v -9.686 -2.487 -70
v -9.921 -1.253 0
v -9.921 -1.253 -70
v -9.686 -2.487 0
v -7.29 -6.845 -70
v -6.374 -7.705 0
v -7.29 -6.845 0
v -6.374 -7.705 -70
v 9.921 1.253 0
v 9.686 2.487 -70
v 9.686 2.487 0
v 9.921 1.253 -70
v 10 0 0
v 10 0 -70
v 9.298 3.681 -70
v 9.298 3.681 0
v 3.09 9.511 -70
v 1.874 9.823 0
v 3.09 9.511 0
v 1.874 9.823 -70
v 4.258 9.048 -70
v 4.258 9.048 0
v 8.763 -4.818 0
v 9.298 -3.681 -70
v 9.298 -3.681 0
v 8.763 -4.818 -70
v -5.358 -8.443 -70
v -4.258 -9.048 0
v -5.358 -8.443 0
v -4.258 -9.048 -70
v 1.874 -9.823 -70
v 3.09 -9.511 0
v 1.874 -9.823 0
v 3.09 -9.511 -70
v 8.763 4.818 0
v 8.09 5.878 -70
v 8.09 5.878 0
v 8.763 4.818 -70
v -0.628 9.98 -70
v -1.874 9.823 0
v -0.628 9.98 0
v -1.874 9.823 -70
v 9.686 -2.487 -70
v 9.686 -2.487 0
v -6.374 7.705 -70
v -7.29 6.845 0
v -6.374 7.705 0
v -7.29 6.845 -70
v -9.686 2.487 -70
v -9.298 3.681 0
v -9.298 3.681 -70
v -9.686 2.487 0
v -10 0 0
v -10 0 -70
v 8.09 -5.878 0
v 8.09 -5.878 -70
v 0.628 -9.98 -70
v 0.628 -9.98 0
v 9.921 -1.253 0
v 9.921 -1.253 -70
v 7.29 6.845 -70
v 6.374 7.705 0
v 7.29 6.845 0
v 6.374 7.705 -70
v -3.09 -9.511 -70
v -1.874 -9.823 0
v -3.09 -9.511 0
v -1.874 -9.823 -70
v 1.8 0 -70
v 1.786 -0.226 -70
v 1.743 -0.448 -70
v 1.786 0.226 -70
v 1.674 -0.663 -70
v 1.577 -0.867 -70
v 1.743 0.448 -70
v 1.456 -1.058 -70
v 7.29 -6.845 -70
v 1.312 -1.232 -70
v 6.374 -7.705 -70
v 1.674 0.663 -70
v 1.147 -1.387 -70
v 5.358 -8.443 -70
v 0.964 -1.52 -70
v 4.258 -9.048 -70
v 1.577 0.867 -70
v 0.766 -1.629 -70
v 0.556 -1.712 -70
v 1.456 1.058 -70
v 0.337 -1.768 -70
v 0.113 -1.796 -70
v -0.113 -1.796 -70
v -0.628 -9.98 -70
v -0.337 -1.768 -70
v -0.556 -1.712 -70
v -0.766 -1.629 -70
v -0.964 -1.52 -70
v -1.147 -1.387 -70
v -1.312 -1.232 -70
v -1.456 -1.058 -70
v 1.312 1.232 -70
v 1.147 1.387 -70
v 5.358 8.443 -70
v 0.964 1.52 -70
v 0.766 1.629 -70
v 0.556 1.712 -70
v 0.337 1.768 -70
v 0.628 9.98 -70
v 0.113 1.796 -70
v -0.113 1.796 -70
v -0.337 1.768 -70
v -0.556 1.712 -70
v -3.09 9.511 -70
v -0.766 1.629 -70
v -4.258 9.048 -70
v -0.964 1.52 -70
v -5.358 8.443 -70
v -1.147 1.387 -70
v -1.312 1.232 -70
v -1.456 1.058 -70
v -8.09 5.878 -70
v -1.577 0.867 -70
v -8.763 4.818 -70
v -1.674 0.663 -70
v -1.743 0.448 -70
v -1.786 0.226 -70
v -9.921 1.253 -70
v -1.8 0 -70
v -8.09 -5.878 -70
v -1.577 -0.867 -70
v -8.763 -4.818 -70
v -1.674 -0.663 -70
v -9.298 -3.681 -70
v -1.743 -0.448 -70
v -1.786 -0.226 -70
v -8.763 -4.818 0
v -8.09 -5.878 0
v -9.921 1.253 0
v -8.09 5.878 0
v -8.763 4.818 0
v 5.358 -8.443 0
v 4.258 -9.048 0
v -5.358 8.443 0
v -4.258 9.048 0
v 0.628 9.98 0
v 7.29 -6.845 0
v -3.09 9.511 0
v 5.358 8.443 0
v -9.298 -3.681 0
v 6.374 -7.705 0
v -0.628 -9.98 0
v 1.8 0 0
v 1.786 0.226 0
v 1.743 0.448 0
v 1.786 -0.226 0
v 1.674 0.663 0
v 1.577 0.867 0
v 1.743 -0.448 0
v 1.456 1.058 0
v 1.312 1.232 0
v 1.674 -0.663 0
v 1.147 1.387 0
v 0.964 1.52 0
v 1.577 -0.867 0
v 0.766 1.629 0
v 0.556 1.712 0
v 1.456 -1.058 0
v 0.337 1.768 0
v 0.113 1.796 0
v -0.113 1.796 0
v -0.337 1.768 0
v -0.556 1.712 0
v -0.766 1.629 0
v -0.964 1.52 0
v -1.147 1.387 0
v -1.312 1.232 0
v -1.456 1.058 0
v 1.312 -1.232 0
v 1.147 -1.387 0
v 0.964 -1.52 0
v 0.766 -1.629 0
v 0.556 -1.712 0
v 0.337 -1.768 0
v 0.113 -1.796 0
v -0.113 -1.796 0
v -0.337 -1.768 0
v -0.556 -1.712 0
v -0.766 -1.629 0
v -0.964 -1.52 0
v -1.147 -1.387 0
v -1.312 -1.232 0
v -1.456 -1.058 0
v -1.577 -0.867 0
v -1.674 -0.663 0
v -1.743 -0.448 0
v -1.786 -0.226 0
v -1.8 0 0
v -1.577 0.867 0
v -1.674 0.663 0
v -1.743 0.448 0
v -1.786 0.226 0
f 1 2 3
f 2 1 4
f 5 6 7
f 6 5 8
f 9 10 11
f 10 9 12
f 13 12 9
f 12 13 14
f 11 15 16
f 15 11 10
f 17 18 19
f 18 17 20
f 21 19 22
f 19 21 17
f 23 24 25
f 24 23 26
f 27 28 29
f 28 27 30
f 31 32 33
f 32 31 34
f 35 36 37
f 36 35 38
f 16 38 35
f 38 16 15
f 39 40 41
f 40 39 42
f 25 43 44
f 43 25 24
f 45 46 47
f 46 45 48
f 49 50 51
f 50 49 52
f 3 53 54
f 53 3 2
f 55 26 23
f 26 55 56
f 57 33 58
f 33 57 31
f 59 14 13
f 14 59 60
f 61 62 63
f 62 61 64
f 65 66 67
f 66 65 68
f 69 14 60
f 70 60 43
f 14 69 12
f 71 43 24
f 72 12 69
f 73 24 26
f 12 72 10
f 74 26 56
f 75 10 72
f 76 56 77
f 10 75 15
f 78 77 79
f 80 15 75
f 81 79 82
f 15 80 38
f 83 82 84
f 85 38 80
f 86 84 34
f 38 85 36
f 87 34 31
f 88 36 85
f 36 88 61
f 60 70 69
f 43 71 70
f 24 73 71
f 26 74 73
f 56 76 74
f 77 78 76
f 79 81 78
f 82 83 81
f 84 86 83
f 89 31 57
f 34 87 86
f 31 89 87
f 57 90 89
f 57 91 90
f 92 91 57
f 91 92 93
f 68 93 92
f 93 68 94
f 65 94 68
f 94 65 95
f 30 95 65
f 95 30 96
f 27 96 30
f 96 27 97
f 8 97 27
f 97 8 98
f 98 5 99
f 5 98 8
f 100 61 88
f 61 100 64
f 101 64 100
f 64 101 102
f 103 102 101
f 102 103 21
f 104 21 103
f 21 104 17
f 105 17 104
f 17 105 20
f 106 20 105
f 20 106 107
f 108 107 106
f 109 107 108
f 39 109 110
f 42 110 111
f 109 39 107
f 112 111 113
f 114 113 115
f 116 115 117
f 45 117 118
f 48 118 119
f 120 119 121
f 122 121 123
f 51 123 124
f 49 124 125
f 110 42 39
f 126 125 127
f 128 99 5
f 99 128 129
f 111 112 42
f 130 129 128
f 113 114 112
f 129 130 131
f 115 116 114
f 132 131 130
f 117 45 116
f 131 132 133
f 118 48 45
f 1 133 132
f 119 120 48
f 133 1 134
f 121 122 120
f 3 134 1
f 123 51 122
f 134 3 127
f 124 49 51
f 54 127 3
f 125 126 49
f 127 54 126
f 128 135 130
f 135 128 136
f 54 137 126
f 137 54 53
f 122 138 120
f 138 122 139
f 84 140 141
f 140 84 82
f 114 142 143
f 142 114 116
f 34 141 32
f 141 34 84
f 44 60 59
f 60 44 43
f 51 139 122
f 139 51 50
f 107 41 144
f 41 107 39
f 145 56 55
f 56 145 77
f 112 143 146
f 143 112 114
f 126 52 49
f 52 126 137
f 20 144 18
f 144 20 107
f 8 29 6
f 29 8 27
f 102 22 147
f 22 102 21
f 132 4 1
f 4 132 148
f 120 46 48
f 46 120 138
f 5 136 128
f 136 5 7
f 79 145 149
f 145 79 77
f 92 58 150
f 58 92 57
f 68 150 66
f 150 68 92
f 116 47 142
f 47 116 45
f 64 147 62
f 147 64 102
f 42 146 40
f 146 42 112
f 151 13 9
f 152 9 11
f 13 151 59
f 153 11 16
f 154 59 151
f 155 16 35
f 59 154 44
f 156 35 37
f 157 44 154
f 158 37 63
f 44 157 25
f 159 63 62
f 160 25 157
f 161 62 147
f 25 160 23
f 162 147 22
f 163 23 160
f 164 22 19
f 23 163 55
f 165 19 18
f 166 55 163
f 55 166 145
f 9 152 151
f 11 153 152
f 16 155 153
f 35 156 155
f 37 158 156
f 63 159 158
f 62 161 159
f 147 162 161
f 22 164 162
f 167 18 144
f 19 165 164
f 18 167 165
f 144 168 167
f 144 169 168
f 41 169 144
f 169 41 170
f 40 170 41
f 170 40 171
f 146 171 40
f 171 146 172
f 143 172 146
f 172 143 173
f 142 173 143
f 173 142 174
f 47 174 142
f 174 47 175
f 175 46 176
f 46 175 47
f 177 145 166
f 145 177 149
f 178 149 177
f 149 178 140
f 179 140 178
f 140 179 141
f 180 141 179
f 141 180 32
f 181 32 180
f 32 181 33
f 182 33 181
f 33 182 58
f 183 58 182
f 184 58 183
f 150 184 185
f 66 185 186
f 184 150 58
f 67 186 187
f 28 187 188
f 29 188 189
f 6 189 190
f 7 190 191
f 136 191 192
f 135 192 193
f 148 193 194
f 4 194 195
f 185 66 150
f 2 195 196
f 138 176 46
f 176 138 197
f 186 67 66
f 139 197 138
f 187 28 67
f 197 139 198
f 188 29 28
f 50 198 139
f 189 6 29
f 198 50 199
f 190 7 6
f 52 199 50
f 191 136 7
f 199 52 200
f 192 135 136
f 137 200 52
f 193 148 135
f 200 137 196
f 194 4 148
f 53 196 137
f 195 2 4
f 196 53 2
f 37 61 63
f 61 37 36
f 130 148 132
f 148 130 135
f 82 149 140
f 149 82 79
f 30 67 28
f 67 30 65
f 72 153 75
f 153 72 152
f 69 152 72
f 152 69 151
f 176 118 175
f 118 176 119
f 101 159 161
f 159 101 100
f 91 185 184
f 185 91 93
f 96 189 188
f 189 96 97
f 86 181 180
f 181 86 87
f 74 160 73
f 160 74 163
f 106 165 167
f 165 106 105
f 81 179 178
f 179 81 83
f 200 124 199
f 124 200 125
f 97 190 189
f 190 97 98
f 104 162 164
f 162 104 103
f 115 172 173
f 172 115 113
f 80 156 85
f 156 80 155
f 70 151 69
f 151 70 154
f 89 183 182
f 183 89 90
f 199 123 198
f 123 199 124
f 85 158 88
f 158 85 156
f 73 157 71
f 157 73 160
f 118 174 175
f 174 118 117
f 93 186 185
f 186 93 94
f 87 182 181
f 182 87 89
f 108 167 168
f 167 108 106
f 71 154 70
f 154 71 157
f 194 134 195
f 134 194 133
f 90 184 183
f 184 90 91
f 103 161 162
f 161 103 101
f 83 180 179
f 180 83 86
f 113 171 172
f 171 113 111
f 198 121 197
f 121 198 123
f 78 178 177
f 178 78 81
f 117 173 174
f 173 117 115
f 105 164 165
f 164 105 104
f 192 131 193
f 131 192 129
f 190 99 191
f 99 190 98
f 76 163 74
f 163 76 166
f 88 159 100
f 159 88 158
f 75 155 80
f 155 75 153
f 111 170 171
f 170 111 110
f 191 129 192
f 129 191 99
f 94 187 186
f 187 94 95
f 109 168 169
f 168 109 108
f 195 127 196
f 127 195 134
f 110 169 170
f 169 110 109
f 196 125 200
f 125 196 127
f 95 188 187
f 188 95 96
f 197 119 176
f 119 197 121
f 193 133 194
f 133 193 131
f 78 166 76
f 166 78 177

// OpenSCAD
$fn = 50;


difference() {
	union() {
		translate(v = [0, 0, -70.0000000000]) {
			cylinder(h = 70, r = 10.0000000000);
		}
	}
	union() {
		#translate(v = [0, 0, -70]) {
			cylinder(h = 70, r = 1.8000000000);
		}
	}
}
